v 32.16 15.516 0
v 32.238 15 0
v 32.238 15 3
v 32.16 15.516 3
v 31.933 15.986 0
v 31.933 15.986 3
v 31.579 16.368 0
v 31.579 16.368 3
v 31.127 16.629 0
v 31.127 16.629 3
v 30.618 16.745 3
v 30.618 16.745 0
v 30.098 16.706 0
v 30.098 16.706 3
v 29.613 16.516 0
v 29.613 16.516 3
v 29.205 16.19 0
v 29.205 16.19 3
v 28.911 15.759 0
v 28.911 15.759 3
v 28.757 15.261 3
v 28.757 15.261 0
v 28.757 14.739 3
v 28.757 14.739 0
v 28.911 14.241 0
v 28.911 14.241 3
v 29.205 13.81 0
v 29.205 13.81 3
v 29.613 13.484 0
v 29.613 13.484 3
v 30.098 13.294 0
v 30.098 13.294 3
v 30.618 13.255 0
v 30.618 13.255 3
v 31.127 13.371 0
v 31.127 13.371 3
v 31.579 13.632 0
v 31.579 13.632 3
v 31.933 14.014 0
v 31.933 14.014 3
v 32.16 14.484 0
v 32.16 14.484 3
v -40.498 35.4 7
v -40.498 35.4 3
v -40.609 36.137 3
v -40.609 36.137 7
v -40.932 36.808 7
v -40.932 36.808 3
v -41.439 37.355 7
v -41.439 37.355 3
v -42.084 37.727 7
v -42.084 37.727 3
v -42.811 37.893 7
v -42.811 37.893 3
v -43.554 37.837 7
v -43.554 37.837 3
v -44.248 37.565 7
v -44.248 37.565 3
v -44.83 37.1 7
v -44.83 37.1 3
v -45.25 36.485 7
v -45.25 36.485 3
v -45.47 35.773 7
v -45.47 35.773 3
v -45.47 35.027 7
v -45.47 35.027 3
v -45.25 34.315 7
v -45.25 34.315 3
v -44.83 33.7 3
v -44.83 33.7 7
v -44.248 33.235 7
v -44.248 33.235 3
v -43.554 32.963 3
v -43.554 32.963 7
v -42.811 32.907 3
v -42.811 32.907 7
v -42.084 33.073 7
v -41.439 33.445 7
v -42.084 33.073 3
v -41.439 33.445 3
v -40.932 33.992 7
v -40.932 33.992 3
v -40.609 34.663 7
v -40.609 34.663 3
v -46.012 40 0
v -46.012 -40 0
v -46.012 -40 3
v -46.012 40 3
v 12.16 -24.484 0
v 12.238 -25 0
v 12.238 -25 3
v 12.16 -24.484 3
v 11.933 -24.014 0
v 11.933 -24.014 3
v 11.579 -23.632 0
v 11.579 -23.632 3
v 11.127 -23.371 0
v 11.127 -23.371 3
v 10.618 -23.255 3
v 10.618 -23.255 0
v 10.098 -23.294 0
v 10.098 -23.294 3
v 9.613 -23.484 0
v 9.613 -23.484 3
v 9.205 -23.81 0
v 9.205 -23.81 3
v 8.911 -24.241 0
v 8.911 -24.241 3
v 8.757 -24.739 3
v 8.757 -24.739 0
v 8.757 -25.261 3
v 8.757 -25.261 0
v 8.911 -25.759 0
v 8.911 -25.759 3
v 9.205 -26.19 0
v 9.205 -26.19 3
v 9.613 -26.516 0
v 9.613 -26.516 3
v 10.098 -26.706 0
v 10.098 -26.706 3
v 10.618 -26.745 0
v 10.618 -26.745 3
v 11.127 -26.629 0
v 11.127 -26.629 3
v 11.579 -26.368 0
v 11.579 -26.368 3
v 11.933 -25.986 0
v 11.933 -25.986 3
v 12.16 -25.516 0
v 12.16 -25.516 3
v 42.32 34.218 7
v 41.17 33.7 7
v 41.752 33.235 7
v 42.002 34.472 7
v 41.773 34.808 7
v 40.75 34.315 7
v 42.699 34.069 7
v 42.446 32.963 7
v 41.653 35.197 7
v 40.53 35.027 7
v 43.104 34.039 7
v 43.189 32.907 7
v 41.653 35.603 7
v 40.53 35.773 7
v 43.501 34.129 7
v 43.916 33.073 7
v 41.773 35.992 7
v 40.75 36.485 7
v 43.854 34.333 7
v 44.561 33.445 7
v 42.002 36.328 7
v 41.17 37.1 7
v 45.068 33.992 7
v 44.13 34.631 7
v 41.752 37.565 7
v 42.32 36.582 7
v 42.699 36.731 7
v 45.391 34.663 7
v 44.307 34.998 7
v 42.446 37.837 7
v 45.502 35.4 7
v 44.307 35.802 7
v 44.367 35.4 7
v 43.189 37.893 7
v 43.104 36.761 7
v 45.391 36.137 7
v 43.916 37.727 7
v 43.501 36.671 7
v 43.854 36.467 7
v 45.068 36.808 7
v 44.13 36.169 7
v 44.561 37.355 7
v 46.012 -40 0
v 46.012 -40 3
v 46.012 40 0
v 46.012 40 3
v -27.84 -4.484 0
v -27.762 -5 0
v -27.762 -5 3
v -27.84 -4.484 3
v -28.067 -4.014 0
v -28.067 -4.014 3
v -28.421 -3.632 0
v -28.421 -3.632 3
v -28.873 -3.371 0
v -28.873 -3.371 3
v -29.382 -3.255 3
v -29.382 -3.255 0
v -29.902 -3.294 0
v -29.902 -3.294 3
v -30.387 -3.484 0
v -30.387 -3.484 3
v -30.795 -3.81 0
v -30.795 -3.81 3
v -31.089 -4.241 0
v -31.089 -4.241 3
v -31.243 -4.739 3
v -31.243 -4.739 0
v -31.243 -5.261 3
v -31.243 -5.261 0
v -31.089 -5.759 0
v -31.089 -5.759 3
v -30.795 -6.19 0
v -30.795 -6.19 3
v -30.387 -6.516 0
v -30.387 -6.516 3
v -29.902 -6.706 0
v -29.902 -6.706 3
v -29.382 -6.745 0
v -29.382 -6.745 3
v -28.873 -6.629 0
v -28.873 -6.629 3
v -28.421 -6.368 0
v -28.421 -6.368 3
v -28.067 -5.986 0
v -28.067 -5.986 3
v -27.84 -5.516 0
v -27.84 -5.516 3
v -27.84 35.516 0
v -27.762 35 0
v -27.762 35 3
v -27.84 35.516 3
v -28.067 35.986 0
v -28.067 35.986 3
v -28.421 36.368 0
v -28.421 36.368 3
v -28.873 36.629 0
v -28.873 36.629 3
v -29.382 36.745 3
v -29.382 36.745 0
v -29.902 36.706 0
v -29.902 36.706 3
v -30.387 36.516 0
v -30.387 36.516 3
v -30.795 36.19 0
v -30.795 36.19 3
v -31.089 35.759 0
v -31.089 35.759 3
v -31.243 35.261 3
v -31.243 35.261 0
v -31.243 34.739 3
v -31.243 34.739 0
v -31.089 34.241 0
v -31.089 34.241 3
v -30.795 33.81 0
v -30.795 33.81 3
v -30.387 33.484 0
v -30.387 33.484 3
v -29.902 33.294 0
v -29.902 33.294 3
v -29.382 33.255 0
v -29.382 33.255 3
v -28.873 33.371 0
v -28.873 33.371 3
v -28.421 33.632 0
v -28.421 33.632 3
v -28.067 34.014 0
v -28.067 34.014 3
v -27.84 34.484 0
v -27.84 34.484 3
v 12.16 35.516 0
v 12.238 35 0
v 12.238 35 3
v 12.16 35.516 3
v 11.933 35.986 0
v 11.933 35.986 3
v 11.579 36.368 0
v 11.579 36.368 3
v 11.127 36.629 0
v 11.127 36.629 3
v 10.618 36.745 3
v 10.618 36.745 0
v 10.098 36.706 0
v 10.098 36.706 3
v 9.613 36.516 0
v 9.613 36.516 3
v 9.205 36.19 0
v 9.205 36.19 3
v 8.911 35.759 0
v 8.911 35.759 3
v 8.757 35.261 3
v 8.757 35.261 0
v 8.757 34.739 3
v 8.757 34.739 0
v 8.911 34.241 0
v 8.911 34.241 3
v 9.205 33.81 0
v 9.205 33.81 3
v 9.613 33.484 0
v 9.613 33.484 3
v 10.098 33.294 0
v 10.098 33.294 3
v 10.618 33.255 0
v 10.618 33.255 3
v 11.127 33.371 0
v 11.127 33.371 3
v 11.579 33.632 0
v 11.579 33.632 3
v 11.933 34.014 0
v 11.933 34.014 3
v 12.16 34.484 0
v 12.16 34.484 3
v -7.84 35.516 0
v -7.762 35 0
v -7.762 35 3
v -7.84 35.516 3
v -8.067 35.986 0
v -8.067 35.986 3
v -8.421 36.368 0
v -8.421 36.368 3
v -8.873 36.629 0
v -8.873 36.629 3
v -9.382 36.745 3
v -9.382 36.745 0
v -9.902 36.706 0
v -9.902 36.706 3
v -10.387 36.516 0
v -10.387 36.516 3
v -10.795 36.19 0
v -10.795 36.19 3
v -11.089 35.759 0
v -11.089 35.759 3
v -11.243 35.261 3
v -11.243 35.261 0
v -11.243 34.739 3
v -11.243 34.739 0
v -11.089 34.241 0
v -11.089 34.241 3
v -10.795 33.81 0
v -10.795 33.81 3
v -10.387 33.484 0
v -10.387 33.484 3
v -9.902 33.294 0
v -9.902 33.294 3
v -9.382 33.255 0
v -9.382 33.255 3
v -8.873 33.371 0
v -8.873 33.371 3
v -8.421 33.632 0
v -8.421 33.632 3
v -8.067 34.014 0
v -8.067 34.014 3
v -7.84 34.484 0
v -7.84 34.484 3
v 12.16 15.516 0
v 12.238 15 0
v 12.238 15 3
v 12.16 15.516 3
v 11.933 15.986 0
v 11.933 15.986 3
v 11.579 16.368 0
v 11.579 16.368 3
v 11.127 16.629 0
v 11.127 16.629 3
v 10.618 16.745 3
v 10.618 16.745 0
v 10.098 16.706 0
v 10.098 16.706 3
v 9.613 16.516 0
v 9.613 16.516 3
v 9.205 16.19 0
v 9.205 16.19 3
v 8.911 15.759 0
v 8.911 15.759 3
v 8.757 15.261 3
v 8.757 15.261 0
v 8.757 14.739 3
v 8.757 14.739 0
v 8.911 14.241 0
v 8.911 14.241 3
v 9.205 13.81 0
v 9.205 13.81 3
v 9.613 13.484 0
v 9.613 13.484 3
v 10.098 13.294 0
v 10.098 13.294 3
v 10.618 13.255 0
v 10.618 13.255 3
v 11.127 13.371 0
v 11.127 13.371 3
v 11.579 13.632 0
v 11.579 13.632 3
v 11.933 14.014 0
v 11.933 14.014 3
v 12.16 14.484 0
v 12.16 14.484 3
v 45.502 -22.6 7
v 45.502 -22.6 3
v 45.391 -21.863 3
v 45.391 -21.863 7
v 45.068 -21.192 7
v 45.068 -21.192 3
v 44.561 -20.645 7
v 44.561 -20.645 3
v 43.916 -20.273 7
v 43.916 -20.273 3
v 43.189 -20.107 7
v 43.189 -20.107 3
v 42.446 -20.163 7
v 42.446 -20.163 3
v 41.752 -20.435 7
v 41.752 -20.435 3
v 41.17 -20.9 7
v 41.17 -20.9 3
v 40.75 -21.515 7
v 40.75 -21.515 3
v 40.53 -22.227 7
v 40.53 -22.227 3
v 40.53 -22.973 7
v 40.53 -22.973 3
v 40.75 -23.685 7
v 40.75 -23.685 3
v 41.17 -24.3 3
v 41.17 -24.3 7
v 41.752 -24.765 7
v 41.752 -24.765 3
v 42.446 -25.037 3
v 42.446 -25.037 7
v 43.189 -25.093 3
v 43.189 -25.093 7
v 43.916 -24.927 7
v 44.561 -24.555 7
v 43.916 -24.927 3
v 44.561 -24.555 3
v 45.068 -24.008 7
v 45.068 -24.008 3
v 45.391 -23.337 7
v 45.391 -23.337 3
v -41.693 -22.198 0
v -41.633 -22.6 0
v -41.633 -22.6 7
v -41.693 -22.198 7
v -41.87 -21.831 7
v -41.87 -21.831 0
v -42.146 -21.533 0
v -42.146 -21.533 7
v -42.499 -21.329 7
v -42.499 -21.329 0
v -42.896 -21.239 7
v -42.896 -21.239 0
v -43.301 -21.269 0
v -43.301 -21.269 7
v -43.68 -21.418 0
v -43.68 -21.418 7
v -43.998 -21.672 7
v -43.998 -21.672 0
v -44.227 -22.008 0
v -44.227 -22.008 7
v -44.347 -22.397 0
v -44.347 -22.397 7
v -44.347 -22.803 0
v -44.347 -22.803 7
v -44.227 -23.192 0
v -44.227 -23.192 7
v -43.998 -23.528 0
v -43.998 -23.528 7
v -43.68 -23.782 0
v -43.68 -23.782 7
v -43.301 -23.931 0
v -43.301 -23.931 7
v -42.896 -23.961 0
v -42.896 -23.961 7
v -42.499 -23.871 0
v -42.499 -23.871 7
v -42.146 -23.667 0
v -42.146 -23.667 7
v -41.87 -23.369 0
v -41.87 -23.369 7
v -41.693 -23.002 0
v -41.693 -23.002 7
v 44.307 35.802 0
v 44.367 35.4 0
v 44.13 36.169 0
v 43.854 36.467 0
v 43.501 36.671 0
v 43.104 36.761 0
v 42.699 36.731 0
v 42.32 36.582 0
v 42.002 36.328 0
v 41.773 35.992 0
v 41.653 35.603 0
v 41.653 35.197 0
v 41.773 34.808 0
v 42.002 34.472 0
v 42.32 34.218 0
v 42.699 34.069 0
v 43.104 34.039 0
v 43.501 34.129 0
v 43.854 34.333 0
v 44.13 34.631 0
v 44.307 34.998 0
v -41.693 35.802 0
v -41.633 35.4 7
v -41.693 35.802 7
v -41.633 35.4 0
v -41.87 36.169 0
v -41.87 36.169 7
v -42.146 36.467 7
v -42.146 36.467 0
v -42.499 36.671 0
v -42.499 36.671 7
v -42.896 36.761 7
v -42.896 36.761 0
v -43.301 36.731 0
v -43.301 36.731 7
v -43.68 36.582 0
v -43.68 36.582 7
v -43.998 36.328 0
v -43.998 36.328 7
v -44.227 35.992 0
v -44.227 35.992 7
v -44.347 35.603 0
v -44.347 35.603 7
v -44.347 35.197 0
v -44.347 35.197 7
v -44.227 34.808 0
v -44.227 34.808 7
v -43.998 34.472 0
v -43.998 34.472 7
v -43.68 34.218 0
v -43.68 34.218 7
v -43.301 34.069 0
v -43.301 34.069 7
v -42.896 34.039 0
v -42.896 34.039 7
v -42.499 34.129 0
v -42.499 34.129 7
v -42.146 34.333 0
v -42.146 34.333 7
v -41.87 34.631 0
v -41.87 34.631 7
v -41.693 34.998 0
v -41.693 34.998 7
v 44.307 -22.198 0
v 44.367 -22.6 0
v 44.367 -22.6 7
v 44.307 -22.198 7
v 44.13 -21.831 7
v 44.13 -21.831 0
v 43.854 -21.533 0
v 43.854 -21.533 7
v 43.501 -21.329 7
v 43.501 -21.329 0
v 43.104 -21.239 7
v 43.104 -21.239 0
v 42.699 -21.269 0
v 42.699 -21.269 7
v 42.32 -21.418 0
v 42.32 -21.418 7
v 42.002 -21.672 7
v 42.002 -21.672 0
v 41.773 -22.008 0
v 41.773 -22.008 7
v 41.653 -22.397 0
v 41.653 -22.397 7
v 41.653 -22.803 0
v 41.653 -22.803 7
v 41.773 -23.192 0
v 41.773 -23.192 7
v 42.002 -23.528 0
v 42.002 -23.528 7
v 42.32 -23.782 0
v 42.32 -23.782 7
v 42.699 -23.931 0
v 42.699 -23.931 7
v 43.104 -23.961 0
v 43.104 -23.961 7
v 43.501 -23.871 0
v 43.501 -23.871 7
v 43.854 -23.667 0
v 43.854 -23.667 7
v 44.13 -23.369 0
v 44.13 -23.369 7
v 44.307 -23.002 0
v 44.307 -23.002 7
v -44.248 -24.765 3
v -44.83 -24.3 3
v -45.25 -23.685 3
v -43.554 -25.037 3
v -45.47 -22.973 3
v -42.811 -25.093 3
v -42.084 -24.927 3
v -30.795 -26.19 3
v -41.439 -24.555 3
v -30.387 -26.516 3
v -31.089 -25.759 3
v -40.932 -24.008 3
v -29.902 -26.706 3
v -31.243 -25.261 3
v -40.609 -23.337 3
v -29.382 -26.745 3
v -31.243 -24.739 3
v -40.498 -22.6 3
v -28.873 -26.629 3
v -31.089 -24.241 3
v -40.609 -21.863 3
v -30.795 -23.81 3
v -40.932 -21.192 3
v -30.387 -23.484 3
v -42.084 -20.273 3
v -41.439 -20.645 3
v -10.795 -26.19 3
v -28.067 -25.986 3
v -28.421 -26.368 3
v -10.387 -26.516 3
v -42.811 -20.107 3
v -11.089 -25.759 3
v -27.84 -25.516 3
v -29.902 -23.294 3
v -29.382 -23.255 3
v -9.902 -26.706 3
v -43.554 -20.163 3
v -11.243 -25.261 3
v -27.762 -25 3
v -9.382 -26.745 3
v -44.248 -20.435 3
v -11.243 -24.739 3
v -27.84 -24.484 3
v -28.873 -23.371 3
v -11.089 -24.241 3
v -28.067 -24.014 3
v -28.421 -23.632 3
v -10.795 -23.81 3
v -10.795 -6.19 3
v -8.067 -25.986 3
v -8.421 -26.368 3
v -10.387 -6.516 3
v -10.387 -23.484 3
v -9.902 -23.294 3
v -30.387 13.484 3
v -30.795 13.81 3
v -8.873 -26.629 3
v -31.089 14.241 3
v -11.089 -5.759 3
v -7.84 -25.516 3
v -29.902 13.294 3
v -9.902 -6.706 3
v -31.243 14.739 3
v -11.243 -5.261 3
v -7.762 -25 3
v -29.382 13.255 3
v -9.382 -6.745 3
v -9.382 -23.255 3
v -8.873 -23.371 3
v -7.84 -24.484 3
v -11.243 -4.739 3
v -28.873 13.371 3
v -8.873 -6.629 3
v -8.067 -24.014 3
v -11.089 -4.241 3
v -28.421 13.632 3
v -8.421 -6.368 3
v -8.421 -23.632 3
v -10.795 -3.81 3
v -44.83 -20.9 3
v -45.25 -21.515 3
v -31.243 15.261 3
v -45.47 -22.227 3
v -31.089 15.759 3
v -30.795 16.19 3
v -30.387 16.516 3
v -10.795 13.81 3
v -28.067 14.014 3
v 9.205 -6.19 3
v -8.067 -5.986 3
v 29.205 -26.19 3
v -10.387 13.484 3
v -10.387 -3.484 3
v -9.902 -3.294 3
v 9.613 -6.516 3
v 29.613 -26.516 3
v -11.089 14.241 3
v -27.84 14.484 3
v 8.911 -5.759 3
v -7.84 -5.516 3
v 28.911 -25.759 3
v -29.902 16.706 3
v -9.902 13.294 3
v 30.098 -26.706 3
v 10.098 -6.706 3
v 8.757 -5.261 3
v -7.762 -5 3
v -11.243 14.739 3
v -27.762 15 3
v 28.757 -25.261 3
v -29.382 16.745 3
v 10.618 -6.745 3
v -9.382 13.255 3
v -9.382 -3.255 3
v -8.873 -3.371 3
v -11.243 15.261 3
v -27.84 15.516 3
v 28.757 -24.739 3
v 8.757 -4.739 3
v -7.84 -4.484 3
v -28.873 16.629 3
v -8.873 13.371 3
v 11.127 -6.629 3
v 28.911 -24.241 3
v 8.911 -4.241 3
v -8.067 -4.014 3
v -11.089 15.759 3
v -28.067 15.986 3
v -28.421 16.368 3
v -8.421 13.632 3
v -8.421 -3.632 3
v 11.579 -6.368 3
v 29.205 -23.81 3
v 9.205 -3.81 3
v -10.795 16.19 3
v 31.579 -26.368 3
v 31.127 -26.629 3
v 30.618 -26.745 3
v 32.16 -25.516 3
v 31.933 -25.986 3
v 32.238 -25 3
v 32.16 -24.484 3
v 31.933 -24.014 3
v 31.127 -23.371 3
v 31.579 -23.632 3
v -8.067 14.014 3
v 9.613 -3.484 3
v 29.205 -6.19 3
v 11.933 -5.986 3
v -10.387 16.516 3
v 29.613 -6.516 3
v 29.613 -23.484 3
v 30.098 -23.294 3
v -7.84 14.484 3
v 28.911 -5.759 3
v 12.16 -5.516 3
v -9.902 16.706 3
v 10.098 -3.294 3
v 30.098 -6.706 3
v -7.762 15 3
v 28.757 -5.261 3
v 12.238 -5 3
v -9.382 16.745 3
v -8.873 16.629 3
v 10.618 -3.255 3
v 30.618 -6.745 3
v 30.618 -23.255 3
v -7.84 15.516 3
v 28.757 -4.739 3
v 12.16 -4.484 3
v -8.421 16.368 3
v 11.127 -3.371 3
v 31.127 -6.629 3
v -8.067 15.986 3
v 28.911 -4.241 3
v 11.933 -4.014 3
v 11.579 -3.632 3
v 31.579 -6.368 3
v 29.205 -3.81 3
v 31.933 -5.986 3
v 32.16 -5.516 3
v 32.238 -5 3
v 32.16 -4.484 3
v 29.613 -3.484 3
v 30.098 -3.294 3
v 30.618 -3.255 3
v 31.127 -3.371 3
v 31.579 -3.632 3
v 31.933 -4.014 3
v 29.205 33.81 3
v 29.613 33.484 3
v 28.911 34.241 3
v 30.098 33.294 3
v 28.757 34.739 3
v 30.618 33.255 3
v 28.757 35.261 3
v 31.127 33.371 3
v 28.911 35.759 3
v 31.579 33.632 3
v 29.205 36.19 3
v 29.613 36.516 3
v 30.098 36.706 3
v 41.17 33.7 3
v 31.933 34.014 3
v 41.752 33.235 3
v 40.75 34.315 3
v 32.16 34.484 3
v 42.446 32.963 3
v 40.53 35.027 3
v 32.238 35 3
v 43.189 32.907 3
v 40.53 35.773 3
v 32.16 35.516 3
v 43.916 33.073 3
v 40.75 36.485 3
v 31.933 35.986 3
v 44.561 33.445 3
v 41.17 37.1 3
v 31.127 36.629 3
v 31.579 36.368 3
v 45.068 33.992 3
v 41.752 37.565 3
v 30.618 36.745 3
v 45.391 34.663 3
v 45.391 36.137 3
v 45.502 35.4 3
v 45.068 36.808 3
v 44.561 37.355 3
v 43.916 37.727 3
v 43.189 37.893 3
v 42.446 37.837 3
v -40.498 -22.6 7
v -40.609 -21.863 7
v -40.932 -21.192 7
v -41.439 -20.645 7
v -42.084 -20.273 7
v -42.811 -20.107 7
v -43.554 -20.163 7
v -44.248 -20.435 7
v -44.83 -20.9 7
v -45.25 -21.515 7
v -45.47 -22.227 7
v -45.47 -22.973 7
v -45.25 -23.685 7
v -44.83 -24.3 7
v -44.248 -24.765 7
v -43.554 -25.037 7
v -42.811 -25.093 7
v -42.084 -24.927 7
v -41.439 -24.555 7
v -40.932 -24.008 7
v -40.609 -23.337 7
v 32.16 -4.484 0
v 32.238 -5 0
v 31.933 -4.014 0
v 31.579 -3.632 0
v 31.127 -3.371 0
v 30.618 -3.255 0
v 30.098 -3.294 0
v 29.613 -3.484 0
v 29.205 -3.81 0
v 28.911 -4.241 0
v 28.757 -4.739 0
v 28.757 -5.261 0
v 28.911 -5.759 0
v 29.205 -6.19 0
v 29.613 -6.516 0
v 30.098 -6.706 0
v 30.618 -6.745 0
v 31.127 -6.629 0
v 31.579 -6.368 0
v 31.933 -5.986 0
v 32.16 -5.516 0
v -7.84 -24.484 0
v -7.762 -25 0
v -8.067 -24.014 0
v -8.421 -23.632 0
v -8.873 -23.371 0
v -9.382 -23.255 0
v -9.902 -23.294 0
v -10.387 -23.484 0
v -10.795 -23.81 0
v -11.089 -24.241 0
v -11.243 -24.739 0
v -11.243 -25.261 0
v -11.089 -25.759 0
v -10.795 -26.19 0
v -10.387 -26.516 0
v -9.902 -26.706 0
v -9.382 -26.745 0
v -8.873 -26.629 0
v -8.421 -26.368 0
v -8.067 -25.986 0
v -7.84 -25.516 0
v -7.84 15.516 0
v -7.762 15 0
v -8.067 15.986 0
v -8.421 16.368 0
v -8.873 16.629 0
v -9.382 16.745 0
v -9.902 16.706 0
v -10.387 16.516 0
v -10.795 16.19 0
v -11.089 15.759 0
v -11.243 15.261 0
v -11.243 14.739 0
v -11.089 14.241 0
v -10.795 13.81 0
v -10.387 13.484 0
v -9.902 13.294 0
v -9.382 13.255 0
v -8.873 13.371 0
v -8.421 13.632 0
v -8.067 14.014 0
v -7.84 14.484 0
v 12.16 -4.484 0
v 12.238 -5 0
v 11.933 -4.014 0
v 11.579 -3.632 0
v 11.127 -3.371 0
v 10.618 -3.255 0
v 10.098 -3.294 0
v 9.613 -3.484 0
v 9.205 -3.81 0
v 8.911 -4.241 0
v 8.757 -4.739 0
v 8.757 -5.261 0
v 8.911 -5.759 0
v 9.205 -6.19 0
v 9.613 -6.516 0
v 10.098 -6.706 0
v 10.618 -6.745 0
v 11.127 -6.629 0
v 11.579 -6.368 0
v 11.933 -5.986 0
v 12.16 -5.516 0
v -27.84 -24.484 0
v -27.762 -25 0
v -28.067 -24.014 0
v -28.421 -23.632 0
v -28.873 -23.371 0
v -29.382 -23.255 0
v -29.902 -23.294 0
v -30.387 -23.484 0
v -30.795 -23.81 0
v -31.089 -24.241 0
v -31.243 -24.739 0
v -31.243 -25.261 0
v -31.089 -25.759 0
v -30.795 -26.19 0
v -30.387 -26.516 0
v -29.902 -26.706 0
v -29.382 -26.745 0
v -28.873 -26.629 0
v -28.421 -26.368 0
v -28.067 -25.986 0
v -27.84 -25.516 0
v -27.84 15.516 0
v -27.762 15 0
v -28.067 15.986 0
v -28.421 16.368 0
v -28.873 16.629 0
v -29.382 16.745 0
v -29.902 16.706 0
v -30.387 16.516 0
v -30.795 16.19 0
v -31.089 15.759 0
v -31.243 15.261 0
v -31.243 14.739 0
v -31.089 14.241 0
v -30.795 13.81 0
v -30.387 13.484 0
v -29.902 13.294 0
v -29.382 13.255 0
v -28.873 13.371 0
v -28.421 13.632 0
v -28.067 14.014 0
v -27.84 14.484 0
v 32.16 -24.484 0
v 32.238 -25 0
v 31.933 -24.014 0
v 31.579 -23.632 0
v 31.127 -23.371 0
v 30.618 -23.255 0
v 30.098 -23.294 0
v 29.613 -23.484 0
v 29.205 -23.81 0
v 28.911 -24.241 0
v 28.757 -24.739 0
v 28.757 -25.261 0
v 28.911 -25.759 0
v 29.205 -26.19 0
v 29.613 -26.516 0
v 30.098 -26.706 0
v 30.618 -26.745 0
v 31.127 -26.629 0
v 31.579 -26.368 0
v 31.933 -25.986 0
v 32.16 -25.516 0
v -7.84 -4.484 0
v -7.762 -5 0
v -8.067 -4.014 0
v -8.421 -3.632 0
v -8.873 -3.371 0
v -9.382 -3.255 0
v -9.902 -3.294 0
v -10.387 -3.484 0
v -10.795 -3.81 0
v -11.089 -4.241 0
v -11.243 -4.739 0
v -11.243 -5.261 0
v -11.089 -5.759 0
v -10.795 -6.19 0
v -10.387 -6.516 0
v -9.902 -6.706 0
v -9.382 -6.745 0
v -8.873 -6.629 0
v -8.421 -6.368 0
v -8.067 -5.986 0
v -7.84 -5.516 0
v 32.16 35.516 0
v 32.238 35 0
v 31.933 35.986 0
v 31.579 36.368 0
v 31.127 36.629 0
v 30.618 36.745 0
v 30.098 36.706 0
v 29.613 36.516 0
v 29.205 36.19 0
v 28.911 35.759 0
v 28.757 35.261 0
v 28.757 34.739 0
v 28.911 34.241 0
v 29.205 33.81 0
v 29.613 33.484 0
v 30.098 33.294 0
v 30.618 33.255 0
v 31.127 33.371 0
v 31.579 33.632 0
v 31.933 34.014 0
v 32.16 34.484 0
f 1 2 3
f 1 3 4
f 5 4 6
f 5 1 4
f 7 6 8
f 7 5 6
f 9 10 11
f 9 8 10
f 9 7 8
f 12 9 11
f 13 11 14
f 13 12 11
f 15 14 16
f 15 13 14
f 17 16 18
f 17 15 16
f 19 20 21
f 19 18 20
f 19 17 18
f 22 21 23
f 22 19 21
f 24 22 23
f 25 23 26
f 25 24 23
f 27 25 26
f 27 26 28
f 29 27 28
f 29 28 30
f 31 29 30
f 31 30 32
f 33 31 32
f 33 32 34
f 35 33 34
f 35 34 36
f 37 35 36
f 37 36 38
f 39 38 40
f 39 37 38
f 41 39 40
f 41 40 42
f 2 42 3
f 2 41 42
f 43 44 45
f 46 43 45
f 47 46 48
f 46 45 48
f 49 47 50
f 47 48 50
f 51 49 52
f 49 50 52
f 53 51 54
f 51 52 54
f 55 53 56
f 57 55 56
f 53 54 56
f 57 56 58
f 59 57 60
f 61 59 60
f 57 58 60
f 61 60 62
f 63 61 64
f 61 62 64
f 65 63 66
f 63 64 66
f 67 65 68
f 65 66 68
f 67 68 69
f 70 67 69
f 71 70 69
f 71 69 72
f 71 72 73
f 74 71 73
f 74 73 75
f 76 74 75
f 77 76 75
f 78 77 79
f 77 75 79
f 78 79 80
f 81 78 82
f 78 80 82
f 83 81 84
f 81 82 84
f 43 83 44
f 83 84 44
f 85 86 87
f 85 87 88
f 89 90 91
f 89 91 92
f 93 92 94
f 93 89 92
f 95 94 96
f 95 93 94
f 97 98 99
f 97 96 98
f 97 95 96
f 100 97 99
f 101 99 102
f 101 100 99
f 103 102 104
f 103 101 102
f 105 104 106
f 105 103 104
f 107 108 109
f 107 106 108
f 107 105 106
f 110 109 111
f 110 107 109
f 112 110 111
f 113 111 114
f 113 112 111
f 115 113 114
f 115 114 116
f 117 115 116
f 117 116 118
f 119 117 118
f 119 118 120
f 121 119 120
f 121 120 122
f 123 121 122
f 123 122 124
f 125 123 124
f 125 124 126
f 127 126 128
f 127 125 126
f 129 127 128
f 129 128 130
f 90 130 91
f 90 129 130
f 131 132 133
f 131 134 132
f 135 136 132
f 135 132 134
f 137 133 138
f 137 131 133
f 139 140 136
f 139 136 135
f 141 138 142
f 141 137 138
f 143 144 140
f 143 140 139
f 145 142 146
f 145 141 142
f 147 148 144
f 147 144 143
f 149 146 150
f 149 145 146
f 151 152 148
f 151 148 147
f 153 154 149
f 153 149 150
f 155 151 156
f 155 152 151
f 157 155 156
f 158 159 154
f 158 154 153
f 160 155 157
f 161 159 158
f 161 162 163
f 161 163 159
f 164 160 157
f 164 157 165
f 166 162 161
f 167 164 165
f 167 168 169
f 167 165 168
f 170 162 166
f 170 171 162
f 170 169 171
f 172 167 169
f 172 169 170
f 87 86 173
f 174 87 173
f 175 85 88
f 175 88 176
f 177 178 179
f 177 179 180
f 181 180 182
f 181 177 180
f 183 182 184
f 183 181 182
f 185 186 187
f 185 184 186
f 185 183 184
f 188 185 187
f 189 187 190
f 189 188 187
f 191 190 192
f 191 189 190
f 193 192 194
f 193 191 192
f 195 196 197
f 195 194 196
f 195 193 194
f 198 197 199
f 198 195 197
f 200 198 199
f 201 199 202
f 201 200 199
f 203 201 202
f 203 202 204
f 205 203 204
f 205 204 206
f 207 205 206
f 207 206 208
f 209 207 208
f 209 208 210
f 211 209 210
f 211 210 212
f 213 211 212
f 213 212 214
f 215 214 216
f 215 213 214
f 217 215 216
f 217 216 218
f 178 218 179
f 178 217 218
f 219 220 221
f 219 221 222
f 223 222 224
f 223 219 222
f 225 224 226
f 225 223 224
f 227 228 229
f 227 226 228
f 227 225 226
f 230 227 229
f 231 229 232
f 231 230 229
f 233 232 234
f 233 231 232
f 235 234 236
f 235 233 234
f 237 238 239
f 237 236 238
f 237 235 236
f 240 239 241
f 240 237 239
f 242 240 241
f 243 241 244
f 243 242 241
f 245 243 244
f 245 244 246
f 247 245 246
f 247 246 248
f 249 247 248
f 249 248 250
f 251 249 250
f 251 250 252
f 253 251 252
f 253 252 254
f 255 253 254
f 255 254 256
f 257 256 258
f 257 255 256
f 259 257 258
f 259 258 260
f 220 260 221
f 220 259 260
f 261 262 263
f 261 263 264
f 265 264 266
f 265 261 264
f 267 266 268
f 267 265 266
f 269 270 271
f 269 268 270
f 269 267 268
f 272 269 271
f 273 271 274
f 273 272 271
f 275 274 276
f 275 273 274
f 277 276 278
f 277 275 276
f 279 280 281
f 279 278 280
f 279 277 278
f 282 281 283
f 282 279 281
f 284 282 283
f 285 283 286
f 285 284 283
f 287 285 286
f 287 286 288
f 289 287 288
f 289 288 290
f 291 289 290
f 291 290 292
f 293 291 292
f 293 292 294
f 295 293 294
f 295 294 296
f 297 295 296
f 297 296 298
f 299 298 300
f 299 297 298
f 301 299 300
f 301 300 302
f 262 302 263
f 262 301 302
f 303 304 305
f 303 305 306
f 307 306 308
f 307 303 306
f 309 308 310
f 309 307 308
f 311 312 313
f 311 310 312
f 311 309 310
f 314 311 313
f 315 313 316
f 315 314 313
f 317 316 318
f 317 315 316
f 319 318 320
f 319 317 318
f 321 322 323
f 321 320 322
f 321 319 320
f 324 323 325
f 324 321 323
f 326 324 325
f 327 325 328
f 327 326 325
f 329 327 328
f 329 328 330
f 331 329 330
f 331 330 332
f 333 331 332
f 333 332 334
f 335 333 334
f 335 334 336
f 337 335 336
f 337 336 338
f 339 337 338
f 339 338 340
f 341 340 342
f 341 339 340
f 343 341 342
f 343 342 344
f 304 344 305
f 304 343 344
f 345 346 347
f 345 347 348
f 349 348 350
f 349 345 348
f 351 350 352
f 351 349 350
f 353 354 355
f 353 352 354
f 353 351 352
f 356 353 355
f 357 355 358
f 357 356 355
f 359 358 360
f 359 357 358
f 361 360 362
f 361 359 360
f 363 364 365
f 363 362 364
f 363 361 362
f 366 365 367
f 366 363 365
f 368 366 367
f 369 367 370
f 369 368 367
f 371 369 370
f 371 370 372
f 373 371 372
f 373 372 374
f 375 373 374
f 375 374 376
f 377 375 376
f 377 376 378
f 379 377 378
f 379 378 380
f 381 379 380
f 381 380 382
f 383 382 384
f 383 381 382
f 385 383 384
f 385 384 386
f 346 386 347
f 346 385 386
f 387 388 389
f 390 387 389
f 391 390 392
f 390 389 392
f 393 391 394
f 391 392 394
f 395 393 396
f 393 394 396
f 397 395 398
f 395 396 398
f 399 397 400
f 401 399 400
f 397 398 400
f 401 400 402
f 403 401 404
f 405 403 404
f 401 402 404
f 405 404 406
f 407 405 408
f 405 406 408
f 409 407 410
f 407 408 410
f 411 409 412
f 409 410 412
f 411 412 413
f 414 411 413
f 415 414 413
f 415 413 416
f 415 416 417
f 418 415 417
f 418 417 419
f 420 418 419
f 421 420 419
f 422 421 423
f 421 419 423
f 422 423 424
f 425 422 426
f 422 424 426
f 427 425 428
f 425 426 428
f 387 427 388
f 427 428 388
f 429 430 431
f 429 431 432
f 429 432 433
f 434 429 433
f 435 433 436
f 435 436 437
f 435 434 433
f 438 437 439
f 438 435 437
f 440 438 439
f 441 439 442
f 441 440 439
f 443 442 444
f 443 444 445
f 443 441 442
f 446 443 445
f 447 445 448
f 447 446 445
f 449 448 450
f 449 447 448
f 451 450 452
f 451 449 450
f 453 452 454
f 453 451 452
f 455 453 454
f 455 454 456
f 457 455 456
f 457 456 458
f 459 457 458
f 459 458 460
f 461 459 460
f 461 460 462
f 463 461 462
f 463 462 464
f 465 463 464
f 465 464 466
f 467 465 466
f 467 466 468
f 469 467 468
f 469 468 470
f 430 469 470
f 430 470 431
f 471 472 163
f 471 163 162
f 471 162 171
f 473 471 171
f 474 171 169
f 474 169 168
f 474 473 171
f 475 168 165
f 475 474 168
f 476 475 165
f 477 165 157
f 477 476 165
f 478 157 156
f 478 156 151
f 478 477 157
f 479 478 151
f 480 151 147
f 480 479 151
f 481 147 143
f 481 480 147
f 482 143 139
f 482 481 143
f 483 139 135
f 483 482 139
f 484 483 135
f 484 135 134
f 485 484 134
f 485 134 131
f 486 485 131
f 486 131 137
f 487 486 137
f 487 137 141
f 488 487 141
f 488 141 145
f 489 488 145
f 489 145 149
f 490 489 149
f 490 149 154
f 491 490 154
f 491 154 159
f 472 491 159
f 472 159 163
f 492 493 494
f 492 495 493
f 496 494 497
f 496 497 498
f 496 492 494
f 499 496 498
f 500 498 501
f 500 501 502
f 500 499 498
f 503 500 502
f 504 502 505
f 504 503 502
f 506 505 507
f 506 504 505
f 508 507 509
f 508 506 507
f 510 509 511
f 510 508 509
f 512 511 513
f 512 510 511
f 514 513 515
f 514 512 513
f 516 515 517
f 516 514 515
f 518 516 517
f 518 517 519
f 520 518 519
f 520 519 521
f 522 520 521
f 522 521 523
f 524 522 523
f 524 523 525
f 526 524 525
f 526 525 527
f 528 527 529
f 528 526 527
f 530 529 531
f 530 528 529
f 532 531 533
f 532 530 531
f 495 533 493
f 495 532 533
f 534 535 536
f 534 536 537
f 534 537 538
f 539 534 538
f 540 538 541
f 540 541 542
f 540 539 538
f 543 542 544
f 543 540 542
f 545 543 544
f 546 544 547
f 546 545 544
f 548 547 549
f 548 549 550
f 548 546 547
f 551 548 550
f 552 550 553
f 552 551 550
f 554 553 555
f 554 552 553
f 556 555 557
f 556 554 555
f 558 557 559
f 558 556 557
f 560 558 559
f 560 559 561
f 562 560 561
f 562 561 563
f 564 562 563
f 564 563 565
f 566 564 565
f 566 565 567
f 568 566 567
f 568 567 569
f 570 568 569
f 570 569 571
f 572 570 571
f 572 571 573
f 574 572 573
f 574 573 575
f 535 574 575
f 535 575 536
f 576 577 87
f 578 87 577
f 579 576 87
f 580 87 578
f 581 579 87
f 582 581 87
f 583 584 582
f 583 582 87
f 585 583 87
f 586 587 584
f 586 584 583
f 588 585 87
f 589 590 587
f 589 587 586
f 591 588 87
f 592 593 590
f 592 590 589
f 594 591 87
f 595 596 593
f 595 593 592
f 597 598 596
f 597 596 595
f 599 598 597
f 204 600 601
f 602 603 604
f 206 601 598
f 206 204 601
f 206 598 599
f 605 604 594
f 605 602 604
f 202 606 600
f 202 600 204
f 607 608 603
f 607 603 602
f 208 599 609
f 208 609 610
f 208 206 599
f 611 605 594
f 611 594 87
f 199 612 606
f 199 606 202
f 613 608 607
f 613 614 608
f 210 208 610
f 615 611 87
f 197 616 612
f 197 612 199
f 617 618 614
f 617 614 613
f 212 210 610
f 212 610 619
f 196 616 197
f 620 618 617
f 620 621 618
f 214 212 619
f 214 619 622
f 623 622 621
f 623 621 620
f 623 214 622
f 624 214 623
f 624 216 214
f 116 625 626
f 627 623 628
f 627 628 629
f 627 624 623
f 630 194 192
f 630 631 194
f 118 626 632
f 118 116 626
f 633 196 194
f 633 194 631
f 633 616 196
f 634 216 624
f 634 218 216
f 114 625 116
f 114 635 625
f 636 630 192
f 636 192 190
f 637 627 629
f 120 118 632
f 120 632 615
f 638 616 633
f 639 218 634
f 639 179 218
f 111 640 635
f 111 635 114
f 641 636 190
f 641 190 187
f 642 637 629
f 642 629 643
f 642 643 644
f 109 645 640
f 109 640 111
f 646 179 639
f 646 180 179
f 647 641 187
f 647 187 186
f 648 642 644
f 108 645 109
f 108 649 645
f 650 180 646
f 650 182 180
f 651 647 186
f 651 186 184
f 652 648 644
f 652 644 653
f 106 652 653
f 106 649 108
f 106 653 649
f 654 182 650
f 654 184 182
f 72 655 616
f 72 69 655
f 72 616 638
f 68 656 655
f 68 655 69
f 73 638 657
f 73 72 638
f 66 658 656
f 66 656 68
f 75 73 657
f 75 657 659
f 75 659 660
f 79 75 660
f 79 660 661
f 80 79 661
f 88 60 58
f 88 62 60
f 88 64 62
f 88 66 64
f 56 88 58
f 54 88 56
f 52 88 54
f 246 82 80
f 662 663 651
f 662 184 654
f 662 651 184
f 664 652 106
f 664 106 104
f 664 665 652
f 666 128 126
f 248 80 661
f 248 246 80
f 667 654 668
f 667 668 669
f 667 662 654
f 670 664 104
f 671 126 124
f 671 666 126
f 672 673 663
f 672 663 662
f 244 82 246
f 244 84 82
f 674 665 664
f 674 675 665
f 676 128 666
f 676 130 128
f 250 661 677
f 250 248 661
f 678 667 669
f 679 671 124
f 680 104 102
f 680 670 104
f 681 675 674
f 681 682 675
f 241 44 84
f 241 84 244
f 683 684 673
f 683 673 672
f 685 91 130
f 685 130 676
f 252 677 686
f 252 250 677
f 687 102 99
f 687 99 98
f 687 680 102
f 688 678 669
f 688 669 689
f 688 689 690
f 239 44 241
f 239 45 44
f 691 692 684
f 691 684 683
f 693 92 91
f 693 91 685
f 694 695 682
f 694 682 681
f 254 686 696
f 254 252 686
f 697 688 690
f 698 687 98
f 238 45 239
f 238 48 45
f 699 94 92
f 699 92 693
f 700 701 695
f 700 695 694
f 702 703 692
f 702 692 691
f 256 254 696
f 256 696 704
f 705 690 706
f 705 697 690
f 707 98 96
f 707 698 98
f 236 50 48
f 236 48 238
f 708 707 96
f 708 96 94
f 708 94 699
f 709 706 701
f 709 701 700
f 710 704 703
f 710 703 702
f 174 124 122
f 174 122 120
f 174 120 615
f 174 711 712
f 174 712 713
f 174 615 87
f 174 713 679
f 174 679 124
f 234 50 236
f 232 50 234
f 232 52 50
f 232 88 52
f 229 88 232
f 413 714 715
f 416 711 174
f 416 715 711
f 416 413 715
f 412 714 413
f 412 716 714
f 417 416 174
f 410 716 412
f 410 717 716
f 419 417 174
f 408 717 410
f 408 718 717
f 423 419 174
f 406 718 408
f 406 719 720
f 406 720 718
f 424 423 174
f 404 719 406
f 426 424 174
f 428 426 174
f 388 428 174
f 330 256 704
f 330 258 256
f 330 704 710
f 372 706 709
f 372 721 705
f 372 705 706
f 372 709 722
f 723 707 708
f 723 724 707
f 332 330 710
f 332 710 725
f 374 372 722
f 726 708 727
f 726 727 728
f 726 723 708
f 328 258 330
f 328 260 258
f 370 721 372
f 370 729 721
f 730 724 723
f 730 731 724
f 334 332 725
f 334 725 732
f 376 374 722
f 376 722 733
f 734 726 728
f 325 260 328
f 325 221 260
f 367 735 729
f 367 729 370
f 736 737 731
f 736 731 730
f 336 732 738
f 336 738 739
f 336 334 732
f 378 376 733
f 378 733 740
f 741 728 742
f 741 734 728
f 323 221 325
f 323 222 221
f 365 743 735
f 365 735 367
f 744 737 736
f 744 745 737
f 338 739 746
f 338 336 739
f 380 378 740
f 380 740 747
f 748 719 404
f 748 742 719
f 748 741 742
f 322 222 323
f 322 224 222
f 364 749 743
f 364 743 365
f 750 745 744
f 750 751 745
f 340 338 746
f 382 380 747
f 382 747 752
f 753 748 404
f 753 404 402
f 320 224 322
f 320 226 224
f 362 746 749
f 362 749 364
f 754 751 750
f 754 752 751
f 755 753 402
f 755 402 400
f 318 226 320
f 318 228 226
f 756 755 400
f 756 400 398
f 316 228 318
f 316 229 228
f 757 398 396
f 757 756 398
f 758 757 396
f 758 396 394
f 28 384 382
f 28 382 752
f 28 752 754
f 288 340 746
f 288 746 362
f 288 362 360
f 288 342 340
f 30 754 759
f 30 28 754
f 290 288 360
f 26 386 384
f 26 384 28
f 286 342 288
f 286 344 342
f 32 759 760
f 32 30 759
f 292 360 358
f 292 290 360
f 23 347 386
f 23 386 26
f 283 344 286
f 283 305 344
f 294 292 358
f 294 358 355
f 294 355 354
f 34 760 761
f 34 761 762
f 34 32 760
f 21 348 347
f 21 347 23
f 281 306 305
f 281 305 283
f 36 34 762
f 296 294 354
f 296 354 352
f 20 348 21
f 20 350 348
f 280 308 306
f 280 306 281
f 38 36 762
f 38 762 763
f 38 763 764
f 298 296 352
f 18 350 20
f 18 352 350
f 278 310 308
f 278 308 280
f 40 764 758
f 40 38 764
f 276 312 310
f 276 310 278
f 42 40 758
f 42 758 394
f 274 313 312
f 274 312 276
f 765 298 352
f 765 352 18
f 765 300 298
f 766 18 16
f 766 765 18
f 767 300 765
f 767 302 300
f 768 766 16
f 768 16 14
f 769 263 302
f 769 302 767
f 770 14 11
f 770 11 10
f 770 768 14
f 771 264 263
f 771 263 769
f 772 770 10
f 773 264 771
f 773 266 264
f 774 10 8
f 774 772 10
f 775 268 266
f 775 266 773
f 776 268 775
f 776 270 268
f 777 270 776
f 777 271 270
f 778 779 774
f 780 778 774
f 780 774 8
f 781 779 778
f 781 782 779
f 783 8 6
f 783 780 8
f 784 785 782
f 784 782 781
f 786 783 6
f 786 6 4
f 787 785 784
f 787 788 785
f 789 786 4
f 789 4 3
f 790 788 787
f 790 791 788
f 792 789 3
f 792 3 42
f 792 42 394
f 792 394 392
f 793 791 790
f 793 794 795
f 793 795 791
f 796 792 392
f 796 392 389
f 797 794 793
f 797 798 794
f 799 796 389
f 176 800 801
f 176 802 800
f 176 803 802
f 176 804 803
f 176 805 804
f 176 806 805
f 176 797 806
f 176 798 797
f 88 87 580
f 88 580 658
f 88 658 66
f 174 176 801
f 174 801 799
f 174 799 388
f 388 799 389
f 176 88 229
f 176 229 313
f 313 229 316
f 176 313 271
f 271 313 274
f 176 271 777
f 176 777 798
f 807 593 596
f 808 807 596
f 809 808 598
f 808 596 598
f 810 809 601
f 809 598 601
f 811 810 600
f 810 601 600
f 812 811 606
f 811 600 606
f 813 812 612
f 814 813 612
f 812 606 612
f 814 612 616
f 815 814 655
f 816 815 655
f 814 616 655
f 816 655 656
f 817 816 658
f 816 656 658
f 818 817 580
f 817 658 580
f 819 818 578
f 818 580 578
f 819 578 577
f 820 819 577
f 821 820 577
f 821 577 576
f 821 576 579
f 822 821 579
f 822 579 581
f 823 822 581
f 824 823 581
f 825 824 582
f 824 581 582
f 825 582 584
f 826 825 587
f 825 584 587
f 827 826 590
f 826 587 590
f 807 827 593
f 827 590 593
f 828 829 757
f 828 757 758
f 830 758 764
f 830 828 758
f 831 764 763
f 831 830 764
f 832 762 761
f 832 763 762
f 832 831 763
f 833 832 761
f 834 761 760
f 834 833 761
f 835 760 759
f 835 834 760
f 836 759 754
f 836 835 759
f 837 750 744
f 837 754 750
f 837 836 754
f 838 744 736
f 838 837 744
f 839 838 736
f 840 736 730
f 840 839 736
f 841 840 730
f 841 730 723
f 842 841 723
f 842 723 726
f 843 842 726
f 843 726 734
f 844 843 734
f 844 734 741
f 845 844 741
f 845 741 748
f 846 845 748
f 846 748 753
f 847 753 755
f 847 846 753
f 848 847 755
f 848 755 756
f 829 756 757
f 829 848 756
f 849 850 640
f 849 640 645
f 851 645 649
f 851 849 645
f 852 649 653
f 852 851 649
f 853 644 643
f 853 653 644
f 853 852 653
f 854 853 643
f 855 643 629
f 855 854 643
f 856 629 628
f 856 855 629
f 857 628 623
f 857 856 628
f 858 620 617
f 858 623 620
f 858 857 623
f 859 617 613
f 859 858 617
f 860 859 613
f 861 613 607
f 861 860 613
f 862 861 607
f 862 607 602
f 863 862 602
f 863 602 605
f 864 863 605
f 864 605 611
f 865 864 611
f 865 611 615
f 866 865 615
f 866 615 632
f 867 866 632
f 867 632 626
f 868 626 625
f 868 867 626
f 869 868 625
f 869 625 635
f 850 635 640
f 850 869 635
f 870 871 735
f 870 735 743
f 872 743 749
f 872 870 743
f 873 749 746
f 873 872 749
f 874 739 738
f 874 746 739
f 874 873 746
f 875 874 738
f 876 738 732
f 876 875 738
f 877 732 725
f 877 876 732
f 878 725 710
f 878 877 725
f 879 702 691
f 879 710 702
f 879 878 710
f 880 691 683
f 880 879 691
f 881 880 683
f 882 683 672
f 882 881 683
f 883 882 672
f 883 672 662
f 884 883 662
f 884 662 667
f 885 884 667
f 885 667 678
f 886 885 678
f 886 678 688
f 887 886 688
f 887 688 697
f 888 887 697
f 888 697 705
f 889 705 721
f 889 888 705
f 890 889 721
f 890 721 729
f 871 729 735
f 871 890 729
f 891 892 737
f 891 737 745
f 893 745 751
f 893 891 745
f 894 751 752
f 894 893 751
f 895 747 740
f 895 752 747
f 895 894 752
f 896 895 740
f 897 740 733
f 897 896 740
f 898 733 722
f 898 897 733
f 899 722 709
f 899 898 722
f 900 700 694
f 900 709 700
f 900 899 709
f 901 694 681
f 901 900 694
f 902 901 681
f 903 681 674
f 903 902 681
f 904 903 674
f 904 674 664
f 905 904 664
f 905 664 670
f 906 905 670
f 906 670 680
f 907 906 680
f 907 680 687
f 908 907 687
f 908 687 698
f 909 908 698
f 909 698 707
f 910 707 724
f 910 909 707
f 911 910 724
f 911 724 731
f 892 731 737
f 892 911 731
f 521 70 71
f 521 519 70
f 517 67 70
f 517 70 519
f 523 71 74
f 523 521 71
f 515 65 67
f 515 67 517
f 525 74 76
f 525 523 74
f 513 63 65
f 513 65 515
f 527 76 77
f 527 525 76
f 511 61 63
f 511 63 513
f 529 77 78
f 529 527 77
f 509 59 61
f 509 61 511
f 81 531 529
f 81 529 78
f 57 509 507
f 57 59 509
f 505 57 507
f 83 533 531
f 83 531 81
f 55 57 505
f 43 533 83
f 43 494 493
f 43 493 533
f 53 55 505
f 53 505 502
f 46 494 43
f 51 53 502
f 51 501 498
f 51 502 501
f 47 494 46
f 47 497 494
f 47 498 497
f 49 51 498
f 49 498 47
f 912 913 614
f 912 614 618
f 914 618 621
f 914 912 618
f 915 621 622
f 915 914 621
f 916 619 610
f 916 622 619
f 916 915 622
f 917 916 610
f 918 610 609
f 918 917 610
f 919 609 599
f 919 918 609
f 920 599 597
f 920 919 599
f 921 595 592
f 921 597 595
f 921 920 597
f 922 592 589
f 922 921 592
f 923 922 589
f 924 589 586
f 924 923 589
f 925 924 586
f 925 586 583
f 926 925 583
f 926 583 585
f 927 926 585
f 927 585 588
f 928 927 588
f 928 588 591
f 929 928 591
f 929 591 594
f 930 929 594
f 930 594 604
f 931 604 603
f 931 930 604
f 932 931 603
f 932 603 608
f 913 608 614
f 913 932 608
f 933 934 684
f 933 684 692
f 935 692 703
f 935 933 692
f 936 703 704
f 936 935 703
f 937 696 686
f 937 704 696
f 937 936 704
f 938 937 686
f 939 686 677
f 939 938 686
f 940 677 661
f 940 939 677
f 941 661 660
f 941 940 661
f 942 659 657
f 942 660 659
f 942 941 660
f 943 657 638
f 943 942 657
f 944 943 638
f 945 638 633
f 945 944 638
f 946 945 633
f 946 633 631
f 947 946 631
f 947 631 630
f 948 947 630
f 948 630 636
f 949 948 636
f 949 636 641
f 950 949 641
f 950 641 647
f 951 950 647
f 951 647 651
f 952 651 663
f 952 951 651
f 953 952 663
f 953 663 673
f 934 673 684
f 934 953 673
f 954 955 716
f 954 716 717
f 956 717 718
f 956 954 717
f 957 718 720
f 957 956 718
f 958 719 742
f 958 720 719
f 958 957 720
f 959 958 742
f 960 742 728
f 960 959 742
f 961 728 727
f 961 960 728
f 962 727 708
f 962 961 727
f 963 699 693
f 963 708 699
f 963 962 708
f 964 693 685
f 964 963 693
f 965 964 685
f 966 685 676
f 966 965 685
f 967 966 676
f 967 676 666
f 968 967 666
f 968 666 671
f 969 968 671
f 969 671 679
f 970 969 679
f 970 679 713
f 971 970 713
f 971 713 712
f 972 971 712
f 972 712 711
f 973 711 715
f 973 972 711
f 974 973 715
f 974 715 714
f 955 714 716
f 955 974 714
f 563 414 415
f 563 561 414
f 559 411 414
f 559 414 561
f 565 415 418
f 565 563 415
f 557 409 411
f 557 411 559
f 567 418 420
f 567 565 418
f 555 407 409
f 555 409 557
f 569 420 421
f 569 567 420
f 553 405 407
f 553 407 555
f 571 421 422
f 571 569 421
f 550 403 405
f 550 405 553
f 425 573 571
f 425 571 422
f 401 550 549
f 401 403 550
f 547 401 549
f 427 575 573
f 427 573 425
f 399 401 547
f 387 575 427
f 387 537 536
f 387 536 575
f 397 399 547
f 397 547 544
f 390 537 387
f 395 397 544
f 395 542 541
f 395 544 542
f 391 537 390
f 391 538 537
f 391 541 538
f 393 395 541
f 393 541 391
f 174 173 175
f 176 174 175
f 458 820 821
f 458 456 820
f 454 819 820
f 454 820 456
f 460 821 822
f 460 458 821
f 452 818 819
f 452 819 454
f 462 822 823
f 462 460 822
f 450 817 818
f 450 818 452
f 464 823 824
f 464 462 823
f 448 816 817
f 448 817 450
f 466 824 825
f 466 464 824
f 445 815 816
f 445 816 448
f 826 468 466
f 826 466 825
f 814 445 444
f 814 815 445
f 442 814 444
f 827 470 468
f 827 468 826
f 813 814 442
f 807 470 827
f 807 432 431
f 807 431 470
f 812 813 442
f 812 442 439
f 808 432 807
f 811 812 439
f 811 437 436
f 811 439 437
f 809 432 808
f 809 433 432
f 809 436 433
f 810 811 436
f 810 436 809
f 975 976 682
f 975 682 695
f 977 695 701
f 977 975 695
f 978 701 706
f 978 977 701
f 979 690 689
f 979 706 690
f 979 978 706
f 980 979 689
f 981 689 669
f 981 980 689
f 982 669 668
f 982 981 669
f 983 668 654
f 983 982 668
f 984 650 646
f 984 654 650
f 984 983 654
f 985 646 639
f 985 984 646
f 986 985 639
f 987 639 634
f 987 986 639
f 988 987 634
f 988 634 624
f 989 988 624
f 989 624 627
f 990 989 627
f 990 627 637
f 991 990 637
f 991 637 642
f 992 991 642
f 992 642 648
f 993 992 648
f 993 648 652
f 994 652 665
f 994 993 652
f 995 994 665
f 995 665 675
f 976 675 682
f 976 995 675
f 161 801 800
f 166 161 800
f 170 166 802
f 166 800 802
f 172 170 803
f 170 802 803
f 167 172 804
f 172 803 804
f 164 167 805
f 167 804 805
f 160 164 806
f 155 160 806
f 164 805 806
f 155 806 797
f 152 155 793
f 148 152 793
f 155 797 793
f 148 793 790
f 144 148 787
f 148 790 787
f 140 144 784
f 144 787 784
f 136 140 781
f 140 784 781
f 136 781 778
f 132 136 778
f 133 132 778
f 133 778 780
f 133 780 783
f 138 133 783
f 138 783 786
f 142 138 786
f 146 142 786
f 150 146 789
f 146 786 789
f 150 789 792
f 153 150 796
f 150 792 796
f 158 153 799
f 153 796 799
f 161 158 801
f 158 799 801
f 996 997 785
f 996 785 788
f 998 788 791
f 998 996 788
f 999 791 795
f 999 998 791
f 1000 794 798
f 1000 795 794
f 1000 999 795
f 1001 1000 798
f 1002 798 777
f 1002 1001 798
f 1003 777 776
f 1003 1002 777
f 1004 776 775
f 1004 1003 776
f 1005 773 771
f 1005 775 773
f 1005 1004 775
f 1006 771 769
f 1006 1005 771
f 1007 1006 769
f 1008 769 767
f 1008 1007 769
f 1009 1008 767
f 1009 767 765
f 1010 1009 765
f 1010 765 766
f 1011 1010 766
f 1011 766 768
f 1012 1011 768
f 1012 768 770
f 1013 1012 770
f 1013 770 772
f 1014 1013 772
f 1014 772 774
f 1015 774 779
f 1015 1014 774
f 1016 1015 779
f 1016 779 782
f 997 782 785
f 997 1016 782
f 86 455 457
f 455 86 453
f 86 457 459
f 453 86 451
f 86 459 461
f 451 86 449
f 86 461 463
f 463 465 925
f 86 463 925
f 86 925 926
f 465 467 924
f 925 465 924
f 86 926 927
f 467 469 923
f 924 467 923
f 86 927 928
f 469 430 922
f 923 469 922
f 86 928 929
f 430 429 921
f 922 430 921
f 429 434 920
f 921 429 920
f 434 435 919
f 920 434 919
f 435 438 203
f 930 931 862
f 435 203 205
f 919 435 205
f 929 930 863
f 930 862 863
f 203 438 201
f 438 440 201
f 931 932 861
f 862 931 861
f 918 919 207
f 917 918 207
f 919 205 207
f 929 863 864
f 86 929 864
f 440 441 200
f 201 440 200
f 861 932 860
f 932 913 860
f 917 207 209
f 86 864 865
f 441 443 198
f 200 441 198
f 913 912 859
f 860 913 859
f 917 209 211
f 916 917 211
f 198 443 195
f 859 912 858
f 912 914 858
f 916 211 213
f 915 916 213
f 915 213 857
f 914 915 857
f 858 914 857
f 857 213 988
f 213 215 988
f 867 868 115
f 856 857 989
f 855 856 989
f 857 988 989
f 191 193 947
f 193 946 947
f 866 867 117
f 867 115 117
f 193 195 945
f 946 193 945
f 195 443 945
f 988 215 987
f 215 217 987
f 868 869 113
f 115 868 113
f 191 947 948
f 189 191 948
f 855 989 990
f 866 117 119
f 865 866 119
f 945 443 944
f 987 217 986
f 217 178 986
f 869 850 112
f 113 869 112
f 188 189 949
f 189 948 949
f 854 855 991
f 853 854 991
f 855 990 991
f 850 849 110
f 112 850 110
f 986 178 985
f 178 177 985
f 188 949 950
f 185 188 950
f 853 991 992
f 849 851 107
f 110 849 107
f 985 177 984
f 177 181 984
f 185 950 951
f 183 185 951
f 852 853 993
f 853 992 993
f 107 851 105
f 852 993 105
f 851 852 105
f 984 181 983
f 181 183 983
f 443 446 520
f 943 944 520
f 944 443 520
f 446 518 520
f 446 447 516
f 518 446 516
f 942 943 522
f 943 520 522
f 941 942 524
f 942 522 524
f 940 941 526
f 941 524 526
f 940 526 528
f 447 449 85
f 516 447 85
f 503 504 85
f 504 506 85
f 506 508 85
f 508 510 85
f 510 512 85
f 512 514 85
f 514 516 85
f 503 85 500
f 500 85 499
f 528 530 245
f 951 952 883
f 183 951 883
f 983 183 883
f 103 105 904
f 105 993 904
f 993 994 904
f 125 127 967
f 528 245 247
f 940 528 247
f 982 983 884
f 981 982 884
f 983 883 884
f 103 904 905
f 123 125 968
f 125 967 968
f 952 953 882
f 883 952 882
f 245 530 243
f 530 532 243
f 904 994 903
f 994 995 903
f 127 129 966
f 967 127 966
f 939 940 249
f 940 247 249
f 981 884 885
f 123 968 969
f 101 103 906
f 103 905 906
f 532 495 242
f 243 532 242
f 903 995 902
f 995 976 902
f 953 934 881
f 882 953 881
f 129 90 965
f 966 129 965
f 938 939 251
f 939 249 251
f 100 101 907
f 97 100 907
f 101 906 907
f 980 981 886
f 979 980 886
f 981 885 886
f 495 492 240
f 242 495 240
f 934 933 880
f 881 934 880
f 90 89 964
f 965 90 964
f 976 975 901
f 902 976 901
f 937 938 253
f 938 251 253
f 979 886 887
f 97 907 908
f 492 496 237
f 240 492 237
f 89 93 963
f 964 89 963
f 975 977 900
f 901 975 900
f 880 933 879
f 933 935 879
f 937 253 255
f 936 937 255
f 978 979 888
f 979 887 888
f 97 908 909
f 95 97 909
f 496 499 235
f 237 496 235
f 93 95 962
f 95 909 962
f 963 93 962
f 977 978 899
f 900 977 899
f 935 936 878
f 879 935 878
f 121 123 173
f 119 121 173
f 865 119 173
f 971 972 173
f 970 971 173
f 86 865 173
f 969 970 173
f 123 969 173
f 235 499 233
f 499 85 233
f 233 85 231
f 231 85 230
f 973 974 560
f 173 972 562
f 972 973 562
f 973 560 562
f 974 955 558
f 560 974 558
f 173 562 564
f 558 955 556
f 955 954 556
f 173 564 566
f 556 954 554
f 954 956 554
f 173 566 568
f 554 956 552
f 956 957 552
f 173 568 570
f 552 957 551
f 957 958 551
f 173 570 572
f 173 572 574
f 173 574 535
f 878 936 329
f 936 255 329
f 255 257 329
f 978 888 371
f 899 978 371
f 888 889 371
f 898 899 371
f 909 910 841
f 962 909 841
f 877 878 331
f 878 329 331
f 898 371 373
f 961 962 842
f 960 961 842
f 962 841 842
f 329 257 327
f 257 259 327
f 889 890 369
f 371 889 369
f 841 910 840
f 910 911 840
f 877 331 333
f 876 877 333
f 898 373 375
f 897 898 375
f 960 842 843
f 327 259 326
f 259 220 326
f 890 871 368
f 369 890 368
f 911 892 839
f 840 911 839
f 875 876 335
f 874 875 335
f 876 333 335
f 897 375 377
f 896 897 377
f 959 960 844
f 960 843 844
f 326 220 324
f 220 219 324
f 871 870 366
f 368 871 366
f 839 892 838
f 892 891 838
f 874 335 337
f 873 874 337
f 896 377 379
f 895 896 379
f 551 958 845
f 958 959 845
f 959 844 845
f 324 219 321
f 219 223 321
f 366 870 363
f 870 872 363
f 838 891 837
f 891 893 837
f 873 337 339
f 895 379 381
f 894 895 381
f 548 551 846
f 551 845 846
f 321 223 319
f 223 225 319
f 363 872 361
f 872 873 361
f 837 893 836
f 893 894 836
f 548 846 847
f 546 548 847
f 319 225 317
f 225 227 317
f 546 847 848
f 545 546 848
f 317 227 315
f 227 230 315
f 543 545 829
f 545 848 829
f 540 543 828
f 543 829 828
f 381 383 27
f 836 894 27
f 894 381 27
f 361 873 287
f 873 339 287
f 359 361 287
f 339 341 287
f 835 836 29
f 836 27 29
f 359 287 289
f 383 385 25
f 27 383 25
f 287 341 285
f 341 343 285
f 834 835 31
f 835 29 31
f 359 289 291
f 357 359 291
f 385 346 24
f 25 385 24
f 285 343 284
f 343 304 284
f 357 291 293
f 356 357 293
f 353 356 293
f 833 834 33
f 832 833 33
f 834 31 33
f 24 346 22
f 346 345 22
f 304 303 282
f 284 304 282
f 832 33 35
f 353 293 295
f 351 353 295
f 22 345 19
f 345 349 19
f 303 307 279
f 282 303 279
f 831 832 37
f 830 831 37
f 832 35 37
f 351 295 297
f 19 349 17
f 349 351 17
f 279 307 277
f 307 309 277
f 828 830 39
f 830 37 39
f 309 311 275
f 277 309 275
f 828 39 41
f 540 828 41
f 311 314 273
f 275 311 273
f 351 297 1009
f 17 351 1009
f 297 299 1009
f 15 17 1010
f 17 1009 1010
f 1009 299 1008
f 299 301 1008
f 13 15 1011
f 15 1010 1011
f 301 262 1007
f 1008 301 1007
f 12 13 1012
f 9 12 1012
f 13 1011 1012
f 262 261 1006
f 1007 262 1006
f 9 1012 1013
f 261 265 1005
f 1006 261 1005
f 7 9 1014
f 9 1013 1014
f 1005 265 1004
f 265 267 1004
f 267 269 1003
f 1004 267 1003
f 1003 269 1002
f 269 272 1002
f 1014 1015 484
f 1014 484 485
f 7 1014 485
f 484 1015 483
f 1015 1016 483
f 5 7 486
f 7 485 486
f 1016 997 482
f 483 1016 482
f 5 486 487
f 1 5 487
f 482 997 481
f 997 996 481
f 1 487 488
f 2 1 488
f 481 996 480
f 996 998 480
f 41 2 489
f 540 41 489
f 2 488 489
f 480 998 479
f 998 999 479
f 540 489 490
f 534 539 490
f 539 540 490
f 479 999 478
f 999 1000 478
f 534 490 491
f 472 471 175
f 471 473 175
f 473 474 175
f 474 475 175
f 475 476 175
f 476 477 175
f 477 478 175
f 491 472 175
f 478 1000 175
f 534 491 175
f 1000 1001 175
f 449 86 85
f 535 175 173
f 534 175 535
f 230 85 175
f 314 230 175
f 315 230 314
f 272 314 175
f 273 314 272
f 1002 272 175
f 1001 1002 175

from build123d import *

# Parameters (mm, degrees)
SKETCH1_W            = 92.024962686
SKETCH1_H            = 80
SKETCH1_R            = 1.365
BOSS_EXTRUDE1_DEPTH  = 3
SKETCH3_R            = 2.5
SKETCH3_R_2          = 1.365
BOSS_EXTRUDE2_DEPTH  = 4
CUT_EXTRUDE2_START   = -4
SKETCH4_R            = 1.75
CUT_EXTRUDE2_DEPTH   = 9
LPATTERN1_COUNT      = 4
LPATTERN1_PITCH      = 20
LPATTERN1_COUNT_DIR2 = 4
LPATTERN1_PITCH_DIR2 = 20


with BuildPart() as part:
    # Sketch1 → Boss-Extrude1 (new body)
    with BuildSketch(Plane.XY):
        Rectangle(SKETCH1_W, SKETCH1_H)
        with Locations((-42.997518657, 35.4)):
            Circle(SKETCH1_R, mode=Mode.SUBTRACT)
        with Locations((43.002481343, 35.4)):
            Circle(SKETCH1_R, mode=Mode.SUBTRACT)
        with Locations((-42.997518657, -22.6)):
            Circle(SKETCH1_R, mode=Mode.SUBTRACT)
        with Locations((43.002481343, -22.6)):
            Circle(SKETCH1_R, mode=Mode.SUBTRACT)
    extrude(amount=BOSS_EXTRUDE1_DEPTH)

    # Sketch3 → Boss-Extrude2 (add)
    with BuildSketch(Plane.XY.offset(3)):
        with Locations((-42.997518657, 35.4)):
            Circle(SKETCH3_R)
        with Locations((-42.997518657, 35.4)):
            Circle(SKETCH3_R_2, mode=Mode.SUBTRACT)
        with Locations((-42.997518657, -22.6)):
            Circle(SKETCH3_R)
        with Locations((-42.997518657, -22.6)):
            Circle(SKETCH3_R_2, mode=Mode.SUBTRACT)
        with Locations((43.002481343, 35.4)):
            Circle(SKETCH3_R)
        with Locations((43.002481343, 35.4)):
            Circle(SKETCH3_R_2, mode=Mode.SUBTRACT)
        with Locations((43.002481343, -22.6)):
            Circle(SKETCH3_R)
        with Locations((43.002481343, -22.6)):
            Circle(SKETCH3_R_2, mode=Mode.SUBTRACT)
    extrude(amount=BOSS_EXTRUDE2_DEPTH)

    # Sketch4 → Cut-Extrude2 (cut)
    with BuildSketch(Plane.XY.offset(3).offset(CUT_EXTRUDE2_START)):
        with Locations((-29.512481343, 35)):
            Circle(SKETCH4_R)
    cut_extrude2 = extrude(amount=CUT_EXTRUDE2_DEPTH, mode=Mode.SUBTRACT)

    # LPattern1: Cut-Extrude2 4 × 4
    with Locations(*[(i * LPATTERN1_PITCH, -j * LPATTERN1_PITCH_DIR2, 0) for i in range(LPATTERN1_COUNT) for j in range(LPATTERN1_COUNT_DIR2) if (i, j) != (0, 0)]):
        add(cut_extrude2, mode=Mode.SUBTRACT)


solid = part.part
